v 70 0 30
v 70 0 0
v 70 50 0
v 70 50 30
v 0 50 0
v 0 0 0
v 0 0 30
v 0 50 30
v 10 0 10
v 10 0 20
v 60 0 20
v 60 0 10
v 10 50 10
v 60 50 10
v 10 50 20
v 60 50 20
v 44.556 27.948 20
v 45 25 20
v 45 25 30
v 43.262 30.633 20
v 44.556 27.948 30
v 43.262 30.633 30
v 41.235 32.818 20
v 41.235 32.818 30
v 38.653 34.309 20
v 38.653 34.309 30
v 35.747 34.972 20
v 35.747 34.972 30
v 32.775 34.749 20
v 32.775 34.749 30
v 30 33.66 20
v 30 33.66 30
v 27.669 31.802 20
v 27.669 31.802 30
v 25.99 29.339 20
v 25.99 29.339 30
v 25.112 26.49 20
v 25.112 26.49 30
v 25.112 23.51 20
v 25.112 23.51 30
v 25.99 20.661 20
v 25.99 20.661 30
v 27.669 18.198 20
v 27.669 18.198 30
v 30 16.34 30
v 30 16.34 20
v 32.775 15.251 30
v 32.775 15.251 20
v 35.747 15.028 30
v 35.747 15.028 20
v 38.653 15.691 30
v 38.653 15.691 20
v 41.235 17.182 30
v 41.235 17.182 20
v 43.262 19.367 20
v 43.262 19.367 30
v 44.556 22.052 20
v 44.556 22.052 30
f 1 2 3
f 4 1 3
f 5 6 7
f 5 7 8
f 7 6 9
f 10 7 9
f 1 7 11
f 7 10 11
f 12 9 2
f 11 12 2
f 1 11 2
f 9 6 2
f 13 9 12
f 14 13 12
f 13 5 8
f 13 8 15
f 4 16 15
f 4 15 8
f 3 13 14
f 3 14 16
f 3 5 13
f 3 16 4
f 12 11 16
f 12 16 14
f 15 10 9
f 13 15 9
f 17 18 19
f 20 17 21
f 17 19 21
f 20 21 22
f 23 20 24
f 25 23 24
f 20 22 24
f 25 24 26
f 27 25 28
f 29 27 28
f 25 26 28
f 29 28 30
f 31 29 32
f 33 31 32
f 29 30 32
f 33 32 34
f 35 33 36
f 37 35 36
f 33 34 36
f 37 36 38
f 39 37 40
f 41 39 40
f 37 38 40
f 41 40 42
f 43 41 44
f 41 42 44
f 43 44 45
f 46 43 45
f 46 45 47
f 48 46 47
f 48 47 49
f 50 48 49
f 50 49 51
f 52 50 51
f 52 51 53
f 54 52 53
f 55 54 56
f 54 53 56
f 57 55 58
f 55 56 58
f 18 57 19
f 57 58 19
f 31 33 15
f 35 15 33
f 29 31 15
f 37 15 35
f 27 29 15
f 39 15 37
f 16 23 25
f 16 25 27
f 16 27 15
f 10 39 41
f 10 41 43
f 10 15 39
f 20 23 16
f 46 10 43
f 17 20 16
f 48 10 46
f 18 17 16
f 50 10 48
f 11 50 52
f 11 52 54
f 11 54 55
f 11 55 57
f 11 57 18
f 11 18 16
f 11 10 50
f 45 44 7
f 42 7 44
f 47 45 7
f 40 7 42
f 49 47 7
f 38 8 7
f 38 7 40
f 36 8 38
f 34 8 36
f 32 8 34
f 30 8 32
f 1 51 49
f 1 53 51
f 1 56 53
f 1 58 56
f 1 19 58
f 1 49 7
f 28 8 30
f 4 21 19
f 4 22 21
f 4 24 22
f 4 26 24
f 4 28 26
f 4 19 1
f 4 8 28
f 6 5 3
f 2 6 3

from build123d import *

# Parameters (mm, degrees)
CROQUIS1_W              = 70
CROQUIS1_H              = 50
SALIENTE_EXTRUIR1_DEPTH = 30
CROQUIS3_W              = 50
CROQUIS3_H              = 10
CORTAR_EXTRUIR1_DEPTH   = 67
CROQUIS4_R              = 10
CORTAR_EXTRUIR2_DEPTH   = 10


with BuildPart() as part:
    # Croquis1 → Saliente-Extruir1 (new body)
    with BuildSketch(Plane.XY):
        with Locations((35, 25)):
            Rectangle(CROQUIS1_W, CROQUIS1_H)
    extrude(amount=SALIENTE_EXTRUIR1_DEPTH)

    # Croquis3 → Cortar-Extruir1 (cut)
    with BuildSketch(Plane(origin=(0, 0, 0), x_dir=(1, 0, 0), z_dir=(0, 1, 0))):
        with Locations((35, -15)):
            Rectangle(CROQUIS3_W, CROQUIS3_H)
    extrude(amount=CORTAR_EXTRUIR1_DEPTH, mode=Mode.SUBTRACT)

    # Croquis4 → Cortar-Extruir2 (cut)
    with BuildSketch(Plane.XY.offset(30)):
        with Locations((35, 25)):
            Circle(CROQUIS4_R)
    extrude(amount=-CORTAR_EXTRUIR2_DEPTH, mode=Mode.SUBTRACT)


solid = part.part
